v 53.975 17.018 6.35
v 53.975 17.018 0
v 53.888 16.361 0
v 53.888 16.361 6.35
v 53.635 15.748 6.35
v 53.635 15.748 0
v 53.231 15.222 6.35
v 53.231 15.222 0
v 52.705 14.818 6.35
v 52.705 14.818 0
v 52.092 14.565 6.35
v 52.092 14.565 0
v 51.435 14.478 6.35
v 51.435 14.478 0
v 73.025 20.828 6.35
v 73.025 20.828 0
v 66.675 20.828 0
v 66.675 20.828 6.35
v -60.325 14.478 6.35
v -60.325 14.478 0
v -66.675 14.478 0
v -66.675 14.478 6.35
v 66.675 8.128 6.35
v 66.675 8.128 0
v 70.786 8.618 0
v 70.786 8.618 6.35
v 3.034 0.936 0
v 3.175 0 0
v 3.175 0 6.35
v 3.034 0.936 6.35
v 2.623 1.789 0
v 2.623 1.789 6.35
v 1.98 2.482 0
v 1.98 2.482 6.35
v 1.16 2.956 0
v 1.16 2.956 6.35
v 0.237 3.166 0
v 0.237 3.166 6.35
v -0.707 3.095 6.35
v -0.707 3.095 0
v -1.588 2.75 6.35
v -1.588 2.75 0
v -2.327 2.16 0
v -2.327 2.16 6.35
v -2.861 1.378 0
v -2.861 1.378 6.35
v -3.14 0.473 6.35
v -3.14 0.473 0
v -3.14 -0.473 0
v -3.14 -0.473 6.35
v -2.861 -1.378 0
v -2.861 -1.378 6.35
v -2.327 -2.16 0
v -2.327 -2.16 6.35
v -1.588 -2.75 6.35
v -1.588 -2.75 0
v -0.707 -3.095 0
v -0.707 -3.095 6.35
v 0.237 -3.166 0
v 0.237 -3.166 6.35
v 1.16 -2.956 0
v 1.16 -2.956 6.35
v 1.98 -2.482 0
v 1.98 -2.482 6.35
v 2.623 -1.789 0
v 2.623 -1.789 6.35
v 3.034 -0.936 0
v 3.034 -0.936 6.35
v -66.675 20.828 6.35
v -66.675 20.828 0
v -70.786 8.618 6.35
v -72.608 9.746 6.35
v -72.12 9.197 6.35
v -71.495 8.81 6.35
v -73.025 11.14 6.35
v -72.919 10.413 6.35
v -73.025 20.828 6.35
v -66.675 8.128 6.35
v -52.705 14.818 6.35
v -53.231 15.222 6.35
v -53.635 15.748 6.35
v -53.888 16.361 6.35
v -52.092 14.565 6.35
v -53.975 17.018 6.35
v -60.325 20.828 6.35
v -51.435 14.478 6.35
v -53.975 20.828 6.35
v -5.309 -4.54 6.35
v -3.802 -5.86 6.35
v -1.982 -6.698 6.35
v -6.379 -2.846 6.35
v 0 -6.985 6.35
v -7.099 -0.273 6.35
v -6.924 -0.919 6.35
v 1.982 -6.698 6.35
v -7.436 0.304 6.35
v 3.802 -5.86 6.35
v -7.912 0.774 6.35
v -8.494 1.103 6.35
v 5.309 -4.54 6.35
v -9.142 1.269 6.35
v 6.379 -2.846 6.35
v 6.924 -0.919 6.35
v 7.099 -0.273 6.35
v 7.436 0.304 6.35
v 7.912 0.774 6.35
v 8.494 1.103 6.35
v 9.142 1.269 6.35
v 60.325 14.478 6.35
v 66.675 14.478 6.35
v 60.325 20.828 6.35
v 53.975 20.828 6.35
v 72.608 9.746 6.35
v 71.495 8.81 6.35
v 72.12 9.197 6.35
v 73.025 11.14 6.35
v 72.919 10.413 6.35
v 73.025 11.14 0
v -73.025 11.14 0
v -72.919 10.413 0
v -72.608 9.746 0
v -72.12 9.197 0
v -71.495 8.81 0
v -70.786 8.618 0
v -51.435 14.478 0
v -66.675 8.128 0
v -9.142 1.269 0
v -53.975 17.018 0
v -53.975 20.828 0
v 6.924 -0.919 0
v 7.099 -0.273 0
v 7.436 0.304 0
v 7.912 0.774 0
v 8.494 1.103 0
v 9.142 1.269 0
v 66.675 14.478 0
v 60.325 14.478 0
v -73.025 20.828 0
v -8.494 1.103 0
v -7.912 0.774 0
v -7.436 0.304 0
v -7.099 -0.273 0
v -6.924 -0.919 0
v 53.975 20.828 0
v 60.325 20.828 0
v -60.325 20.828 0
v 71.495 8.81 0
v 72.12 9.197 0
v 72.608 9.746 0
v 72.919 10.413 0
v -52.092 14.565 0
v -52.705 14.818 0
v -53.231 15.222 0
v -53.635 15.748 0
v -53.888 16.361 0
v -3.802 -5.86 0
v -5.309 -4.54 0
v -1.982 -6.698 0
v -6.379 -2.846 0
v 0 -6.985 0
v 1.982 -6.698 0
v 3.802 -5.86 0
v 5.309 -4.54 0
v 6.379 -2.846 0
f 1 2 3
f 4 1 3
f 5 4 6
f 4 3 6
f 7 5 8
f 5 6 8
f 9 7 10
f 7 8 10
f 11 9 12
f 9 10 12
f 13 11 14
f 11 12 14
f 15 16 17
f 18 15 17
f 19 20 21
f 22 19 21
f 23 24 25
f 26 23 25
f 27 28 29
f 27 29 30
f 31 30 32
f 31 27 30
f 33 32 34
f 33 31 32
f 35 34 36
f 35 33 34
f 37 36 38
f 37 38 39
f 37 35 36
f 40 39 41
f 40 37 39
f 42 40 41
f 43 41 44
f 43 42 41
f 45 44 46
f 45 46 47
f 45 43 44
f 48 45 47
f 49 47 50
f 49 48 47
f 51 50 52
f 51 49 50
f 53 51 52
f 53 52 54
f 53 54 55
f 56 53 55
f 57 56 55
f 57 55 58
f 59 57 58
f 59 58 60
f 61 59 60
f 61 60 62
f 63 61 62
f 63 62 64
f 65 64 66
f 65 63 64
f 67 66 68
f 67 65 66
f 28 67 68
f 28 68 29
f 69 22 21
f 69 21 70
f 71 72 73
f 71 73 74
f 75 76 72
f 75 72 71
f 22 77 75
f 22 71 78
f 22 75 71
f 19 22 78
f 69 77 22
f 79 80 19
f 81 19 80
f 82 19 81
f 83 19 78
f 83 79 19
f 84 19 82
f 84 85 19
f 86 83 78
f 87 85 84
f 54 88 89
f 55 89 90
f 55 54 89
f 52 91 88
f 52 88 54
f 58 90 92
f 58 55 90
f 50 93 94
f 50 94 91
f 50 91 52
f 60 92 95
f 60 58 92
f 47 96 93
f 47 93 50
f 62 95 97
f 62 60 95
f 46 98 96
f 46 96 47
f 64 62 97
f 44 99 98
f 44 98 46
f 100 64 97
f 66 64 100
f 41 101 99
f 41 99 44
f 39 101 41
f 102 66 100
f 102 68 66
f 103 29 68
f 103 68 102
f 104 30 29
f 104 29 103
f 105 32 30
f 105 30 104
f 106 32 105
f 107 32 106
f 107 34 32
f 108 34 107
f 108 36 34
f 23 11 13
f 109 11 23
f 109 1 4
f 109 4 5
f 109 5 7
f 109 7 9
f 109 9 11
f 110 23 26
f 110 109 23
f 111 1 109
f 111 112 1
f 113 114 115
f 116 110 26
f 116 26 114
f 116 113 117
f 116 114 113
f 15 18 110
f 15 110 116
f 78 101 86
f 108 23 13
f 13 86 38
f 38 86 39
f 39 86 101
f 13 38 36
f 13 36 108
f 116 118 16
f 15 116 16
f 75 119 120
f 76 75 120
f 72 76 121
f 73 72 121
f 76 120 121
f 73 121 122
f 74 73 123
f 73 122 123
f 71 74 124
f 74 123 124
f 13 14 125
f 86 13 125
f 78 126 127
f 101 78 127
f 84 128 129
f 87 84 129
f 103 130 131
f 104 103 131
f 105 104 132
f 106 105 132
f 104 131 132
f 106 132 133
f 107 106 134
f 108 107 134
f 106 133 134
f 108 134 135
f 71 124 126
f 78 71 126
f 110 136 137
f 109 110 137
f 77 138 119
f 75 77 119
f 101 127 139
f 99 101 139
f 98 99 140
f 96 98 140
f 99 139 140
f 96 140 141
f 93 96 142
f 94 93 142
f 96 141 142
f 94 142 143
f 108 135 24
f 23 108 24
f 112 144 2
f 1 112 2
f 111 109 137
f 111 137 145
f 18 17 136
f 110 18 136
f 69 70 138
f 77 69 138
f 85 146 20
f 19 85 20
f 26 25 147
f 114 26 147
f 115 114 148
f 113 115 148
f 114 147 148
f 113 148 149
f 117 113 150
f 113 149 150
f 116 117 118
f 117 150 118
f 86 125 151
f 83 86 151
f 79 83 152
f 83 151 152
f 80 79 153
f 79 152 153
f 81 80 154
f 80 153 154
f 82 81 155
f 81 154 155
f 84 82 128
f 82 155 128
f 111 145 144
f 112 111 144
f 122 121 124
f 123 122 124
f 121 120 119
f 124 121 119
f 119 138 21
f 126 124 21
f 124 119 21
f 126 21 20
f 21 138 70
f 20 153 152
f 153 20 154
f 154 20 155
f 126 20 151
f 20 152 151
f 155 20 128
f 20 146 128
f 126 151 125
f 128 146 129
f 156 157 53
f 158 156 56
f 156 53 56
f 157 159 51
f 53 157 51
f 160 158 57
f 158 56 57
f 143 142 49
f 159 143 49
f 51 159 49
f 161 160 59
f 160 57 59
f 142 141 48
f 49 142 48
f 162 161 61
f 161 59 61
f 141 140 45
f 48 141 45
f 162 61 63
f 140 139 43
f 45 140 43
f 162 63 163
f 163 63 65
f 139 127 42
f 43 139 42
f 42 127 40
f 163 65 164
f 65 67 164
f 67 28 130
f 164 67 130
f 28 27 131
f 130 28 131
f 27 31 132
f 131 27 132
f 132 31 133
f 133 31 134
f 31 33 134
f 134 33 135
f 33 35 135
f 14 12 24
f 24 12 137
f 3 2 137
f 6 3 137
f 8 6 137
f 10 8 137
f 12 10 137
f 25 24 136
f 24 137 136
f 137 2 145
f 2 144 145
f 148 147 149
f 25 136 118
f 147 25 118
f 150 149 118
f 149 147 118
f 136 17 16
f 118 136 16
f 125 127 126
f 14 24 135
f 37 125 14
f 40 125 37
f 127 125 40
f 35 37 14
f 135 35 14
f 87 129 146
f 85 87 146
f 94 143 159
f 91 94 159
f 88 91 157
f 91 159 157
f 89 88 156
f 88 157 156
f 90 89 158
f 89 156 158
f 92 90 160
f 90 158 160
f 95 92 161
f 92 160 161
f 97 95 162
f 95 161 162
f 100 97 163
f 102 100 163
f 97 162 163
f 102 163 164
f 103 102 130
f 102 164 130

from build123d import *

# Parameters (mm, degrees)
SKETCH1_R      = 3.175
EXTRUDE1_DEPTH = 6.35


with BuildPart() as part:
    # Sketch1 → Extrude1 (new body)
    with BuildSketch(Plane.XY):
        with BuildLine():
            Line((-66.675, 8.128), (-9.141527829, 1.269026149))
            ThreePointArc((-9.141527829, 1.269026149), (-7.658129481, 0.554828765), (-6.924287371, -0.91895016))
            ThreePointArc((-6.924287371, -0.91895016), (0, -6.985), (6.924287371, -0.91895016))
            ThreePointArc((6.924287371, -0.91895016), (7.658129481, 0.554828765), (9.141527829, 1.269026149))
            Line((9.141527829, 1.269026149), (66.675, 8.128))
            Line((66.675, 8.128), (70.785682223, 8.618063624))
            ThreePointArc((70.785682223, 8.618063624), (72.384385802, 9.453807003), (73.025, 11.140203628))
            Line((73.025, 11.140203628), (73.025, 20.828))
            Line((73.025, 20.828), (66.675, 20.828))
            Line((66.675, 20.828), (66.675, 14.478))
            Line((66.675, 14.478), (60.325, 14.478))
            Line((60.325, 14.478), (60.325, 20.828))
            Line((60.325, 20.828), (53.975, 20.828))
            Line((53.975, 20.828), (53.975, 17.018))
            ThreePointArc((53.975, 17.018), (53.231051224, 15.221948776), (51.435, 14.478))
            Line((51.435, 14.478), (-51.435, 14.478))
            ThreePointArc((-51.435, 14.478), (-53.231051224, 15.221948776), (-53.975, 17.018))
            Line((-53.975, 17.018), (-53.975, 20.828))
            Line((-53.975, 20.828), (-60.325, 20.828))
            Line((-60.325, 20.828), (-60.325, 14.478))
            Line((-60.325, 14.478), (-66.675, 14.478))
            Line((-66.675, 14.478), (-66.675, 20.828))
            Line((-66.675, 20.828), (-73.025, 20.828))
            Line((-73.025, 20.828), (-73.025, 11.140203628))
            ThreePointArc((-73.025, 11.140203628), (-72.384385802, 9.453807003), (-70.785682223, 8.618063624))
            Line((-70.785682223, 8.618063624), (-66.675, 8.128))
        make_face()
        Circle(SKETCH1_R, mode=Mode.SUBTRACT)
    extrude(amount=EXTRUDE1_DEPTH)


solid = part.part
